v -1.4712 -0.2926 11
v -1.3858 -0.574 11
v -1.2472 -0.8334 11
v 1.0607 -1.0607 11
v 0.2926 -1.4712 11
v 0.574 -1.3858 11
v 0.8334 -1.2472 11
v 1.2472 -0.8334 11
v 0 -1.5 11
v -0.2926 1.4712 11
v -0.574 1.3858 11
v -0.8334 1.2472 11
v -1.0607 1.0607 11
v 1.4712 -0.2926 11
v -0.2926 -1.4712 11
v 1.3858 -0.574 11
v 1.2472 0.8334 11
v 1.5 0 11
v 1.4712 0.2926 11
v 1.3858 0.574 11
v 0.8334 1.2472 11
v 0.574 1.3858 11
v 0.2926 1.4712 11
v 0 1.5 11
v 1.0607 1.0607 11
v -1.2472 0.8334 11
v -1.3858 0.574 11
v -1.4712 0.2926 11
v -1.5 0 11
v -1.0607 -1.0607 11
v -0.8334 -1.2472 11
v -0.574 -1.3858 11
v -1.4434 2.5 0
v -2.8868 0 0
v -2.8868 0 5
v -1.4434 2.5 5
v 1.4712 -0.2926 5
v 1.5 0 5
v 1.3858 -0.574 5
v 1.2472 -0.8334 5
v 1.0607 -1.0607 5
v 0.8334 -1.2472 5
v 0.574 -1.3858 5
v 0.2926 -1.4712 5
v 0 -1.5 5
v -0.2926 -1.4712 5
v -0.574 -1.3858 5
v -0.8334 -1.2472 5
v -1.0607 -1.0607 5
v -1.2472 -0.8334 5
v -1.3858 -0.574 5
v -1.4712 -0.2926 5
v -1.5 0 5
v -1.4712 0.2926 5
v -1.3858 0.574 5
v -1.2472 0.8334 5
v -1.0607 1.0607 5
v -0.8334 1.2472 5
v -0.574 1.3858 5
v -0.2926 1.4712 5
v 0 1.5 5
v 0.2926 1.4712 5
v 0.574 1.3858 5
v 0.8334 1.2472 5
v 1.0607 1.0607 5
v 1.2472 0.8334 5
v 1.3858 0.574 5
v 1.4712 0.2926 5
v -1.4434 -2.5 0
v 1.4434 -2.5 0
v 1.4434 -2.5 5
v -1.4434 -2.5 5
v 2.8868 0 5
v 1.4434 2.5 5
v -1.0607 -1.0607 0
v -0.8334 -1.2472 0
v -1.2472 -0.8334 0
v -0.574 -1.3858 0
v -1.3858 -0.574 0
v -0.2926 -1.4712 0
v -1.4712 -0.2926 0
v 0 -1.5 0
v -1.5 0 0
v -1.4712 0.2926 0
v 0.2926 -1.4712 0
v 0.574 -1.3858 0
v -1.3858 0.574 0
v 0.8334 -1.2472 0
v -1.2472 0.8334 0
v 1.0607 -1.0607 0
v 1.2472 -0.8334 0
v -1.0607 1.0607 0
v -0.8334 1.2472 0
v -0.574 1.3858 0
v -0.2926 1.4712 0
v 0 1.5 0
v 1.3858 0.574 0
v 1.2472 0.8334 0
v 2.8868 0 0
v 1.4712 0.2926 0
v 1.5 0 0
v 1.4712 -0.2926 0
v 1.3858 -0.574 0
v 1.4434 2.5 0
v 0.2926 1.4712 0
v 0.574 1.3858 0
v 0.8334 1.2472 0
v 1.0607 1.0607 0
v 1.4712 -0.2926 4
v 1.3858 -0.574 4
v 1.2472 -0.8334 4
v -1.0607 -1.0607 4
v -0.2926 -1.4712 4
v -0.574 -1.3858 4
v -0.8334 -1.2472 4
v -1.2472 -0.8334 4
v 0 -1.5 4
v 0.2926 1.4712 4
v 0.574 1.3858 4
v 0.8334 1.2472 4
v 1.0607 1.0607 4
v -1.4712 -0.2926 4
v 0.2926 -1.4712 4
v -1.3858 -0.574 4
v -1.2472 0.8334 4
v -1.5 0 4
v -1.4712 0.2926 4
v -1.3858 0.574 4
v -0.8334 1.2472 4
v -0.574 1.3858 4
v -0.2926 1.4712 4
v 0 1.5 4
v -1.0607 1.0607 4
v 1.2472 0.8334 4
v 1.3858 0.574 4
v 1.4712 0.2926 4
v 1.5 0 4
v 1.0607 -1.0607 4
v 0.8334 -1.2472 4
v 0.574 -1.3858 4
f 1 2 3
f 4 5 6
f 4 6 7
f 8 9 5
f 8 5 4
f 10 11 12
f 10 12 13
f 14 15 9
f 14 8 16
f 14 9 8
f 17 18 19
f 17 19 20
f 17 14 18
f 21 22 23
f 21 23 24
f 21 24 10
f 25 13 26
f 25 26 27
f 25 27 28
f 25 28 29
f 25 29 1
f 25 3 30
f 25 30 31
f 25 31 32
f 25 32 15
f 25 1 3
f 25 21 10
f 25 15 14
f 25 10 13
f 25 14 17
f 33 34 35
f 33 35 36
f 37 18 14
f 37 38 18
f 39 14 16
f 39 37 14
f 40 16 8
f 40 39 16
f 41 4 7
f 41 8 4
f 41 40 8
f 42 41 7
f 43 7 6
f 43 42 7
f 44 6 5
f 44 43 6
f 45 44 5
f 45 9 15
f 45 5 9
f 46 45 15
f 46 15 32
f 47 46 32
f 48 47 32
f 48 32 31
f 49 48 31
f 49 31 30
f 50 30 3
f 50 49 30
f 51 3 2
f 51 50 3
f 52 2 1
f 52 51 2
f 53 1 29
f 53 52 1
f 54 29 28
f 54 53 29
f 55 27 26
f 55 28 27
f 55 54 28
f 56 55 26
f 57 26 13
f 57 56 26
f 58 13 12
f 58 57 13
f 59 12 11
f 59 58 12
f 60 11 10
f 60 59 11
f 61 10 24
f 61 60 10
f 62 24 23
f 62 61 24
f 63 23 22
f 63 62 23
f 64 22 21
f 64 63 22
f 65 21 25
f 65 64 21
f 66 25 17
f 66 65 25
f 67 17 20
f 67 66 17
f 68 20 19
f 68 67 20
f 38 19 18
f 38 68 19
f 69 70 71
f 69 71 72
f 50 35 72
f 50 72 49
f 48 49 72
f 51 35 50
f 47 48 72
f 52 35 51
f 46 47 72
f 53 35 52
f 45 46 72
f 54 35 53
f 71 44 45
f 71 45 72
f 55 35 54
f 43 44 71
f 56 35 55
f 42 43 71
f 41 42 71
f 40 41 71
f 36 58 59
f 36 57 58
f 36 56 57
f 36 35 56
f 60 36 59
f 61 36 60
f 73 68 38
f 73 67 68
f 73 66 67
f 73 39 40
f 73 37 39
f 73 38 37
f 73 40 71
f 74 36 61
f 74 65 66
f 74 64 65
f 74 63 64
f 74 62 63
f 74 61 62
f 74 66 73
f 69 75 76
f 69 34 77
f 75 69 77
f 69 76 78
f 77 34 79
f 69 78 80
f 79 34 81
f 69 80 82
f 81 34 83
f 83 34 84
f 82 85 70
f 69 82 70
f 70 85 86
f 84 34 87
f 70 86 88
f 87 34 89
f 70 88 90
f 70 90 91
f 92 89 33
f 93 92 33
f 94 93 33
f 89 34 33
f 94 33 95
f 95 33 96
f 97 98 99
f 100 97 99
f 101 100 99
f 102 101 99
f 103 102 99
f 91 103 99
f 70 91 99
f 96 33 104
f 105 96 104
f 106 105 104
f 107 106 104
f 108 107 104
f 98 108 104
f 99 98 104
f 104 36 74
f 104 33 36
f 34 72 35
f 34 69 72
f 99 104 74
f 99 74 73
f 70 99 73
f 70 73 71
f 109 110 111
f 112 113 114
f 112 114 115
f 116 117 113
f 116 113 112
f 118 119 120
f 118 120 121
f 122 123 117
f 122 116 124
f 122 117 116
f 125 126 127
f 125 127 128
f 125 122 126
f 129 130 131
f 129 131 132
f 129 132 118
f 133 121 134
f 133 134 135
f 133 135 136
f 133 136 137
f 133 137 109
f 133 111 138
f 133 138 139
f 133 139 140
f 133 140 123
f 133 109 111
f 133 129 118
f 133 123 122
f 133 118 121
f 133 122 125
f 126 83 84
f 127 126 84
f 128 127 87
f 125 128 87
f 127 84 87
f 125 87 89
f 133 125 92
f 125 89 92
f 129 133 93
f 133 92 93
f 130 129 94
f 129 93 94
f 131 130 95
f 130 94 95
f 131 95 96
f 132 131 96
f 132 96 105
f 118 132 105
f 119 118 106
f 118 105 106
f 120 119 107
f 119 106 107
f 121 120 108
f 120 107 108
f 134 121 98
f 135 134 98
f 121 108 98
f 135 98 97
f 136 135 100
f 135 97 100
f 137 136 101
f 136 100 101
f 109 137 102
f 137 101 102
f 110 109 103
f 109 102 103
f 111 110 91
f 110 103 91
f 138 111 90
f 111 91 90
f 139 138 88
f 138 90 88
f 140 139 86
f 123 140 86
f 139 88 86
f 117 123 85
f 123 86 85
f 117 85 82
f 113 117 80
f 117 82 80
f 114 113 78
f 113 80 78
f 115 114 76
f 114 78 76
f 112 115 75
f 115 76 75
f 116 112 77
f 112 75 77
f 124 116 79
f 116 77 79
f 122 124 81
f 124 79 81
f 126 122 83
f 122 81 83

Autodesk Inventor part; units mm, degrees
ref_plane "YZ Plane" through (0, 0, 0) normal (1, 0, 0) x (0, 1, 0)
ref_plane "XZ Plane" through (0, 0, 0) normal (0, 1, 0) x (-1, 0, 0)
ref_plane "XY Plane" through (0, 0, 0) normal (0, 0, 1) x (1, 0, 0)
sketch "Sketch1" plane through (0, 0, 0) normal (0, 0, 1) x (1, 0, 0)
  line L0 (2.8868, 0) -> (1.4434, -2.5)
  line L1 (1.4434, -2.5) -> (-1.4434, -2.5)
  line L2 (-1.4434, -2.5) -> (-2.8868, 0)
  line L3 (-2.8868, 0) -> (-1.4434, 2.5)
  line L4 (-1.4434, 2.5) -> (1.4434, 2.5)
  line L5 (1.4434, 2.5) -> (2.8868, 0)
  point P0 (0, 0)
  point P1 (0, 0)
  dimension "d0" = 5
extrude "Extrusion1" add sketch "Sketch1" along normal blind 5
sketch "Sketch2" plane through (0, 0, 5) normal (0, 0, 1) x (1, 0, 0)
  circle A0 centre (0, 0) radius 1.5
  dimension "d3" = 3
extrude "Extrusion2" add sketch "Sketch2" along normal blind 6
sketch "Sketch3" plane through (0, 0, 0) normal (0, 0, -1) x (-1, 0, 0)
  circle A0 centre (0, 0) radius 1.5
  dimension "d6" = 3
extrude "Extrusion3" cut sketch "Sketch3" against normal blind 4
properties part number "Spacer7mm_m3"
